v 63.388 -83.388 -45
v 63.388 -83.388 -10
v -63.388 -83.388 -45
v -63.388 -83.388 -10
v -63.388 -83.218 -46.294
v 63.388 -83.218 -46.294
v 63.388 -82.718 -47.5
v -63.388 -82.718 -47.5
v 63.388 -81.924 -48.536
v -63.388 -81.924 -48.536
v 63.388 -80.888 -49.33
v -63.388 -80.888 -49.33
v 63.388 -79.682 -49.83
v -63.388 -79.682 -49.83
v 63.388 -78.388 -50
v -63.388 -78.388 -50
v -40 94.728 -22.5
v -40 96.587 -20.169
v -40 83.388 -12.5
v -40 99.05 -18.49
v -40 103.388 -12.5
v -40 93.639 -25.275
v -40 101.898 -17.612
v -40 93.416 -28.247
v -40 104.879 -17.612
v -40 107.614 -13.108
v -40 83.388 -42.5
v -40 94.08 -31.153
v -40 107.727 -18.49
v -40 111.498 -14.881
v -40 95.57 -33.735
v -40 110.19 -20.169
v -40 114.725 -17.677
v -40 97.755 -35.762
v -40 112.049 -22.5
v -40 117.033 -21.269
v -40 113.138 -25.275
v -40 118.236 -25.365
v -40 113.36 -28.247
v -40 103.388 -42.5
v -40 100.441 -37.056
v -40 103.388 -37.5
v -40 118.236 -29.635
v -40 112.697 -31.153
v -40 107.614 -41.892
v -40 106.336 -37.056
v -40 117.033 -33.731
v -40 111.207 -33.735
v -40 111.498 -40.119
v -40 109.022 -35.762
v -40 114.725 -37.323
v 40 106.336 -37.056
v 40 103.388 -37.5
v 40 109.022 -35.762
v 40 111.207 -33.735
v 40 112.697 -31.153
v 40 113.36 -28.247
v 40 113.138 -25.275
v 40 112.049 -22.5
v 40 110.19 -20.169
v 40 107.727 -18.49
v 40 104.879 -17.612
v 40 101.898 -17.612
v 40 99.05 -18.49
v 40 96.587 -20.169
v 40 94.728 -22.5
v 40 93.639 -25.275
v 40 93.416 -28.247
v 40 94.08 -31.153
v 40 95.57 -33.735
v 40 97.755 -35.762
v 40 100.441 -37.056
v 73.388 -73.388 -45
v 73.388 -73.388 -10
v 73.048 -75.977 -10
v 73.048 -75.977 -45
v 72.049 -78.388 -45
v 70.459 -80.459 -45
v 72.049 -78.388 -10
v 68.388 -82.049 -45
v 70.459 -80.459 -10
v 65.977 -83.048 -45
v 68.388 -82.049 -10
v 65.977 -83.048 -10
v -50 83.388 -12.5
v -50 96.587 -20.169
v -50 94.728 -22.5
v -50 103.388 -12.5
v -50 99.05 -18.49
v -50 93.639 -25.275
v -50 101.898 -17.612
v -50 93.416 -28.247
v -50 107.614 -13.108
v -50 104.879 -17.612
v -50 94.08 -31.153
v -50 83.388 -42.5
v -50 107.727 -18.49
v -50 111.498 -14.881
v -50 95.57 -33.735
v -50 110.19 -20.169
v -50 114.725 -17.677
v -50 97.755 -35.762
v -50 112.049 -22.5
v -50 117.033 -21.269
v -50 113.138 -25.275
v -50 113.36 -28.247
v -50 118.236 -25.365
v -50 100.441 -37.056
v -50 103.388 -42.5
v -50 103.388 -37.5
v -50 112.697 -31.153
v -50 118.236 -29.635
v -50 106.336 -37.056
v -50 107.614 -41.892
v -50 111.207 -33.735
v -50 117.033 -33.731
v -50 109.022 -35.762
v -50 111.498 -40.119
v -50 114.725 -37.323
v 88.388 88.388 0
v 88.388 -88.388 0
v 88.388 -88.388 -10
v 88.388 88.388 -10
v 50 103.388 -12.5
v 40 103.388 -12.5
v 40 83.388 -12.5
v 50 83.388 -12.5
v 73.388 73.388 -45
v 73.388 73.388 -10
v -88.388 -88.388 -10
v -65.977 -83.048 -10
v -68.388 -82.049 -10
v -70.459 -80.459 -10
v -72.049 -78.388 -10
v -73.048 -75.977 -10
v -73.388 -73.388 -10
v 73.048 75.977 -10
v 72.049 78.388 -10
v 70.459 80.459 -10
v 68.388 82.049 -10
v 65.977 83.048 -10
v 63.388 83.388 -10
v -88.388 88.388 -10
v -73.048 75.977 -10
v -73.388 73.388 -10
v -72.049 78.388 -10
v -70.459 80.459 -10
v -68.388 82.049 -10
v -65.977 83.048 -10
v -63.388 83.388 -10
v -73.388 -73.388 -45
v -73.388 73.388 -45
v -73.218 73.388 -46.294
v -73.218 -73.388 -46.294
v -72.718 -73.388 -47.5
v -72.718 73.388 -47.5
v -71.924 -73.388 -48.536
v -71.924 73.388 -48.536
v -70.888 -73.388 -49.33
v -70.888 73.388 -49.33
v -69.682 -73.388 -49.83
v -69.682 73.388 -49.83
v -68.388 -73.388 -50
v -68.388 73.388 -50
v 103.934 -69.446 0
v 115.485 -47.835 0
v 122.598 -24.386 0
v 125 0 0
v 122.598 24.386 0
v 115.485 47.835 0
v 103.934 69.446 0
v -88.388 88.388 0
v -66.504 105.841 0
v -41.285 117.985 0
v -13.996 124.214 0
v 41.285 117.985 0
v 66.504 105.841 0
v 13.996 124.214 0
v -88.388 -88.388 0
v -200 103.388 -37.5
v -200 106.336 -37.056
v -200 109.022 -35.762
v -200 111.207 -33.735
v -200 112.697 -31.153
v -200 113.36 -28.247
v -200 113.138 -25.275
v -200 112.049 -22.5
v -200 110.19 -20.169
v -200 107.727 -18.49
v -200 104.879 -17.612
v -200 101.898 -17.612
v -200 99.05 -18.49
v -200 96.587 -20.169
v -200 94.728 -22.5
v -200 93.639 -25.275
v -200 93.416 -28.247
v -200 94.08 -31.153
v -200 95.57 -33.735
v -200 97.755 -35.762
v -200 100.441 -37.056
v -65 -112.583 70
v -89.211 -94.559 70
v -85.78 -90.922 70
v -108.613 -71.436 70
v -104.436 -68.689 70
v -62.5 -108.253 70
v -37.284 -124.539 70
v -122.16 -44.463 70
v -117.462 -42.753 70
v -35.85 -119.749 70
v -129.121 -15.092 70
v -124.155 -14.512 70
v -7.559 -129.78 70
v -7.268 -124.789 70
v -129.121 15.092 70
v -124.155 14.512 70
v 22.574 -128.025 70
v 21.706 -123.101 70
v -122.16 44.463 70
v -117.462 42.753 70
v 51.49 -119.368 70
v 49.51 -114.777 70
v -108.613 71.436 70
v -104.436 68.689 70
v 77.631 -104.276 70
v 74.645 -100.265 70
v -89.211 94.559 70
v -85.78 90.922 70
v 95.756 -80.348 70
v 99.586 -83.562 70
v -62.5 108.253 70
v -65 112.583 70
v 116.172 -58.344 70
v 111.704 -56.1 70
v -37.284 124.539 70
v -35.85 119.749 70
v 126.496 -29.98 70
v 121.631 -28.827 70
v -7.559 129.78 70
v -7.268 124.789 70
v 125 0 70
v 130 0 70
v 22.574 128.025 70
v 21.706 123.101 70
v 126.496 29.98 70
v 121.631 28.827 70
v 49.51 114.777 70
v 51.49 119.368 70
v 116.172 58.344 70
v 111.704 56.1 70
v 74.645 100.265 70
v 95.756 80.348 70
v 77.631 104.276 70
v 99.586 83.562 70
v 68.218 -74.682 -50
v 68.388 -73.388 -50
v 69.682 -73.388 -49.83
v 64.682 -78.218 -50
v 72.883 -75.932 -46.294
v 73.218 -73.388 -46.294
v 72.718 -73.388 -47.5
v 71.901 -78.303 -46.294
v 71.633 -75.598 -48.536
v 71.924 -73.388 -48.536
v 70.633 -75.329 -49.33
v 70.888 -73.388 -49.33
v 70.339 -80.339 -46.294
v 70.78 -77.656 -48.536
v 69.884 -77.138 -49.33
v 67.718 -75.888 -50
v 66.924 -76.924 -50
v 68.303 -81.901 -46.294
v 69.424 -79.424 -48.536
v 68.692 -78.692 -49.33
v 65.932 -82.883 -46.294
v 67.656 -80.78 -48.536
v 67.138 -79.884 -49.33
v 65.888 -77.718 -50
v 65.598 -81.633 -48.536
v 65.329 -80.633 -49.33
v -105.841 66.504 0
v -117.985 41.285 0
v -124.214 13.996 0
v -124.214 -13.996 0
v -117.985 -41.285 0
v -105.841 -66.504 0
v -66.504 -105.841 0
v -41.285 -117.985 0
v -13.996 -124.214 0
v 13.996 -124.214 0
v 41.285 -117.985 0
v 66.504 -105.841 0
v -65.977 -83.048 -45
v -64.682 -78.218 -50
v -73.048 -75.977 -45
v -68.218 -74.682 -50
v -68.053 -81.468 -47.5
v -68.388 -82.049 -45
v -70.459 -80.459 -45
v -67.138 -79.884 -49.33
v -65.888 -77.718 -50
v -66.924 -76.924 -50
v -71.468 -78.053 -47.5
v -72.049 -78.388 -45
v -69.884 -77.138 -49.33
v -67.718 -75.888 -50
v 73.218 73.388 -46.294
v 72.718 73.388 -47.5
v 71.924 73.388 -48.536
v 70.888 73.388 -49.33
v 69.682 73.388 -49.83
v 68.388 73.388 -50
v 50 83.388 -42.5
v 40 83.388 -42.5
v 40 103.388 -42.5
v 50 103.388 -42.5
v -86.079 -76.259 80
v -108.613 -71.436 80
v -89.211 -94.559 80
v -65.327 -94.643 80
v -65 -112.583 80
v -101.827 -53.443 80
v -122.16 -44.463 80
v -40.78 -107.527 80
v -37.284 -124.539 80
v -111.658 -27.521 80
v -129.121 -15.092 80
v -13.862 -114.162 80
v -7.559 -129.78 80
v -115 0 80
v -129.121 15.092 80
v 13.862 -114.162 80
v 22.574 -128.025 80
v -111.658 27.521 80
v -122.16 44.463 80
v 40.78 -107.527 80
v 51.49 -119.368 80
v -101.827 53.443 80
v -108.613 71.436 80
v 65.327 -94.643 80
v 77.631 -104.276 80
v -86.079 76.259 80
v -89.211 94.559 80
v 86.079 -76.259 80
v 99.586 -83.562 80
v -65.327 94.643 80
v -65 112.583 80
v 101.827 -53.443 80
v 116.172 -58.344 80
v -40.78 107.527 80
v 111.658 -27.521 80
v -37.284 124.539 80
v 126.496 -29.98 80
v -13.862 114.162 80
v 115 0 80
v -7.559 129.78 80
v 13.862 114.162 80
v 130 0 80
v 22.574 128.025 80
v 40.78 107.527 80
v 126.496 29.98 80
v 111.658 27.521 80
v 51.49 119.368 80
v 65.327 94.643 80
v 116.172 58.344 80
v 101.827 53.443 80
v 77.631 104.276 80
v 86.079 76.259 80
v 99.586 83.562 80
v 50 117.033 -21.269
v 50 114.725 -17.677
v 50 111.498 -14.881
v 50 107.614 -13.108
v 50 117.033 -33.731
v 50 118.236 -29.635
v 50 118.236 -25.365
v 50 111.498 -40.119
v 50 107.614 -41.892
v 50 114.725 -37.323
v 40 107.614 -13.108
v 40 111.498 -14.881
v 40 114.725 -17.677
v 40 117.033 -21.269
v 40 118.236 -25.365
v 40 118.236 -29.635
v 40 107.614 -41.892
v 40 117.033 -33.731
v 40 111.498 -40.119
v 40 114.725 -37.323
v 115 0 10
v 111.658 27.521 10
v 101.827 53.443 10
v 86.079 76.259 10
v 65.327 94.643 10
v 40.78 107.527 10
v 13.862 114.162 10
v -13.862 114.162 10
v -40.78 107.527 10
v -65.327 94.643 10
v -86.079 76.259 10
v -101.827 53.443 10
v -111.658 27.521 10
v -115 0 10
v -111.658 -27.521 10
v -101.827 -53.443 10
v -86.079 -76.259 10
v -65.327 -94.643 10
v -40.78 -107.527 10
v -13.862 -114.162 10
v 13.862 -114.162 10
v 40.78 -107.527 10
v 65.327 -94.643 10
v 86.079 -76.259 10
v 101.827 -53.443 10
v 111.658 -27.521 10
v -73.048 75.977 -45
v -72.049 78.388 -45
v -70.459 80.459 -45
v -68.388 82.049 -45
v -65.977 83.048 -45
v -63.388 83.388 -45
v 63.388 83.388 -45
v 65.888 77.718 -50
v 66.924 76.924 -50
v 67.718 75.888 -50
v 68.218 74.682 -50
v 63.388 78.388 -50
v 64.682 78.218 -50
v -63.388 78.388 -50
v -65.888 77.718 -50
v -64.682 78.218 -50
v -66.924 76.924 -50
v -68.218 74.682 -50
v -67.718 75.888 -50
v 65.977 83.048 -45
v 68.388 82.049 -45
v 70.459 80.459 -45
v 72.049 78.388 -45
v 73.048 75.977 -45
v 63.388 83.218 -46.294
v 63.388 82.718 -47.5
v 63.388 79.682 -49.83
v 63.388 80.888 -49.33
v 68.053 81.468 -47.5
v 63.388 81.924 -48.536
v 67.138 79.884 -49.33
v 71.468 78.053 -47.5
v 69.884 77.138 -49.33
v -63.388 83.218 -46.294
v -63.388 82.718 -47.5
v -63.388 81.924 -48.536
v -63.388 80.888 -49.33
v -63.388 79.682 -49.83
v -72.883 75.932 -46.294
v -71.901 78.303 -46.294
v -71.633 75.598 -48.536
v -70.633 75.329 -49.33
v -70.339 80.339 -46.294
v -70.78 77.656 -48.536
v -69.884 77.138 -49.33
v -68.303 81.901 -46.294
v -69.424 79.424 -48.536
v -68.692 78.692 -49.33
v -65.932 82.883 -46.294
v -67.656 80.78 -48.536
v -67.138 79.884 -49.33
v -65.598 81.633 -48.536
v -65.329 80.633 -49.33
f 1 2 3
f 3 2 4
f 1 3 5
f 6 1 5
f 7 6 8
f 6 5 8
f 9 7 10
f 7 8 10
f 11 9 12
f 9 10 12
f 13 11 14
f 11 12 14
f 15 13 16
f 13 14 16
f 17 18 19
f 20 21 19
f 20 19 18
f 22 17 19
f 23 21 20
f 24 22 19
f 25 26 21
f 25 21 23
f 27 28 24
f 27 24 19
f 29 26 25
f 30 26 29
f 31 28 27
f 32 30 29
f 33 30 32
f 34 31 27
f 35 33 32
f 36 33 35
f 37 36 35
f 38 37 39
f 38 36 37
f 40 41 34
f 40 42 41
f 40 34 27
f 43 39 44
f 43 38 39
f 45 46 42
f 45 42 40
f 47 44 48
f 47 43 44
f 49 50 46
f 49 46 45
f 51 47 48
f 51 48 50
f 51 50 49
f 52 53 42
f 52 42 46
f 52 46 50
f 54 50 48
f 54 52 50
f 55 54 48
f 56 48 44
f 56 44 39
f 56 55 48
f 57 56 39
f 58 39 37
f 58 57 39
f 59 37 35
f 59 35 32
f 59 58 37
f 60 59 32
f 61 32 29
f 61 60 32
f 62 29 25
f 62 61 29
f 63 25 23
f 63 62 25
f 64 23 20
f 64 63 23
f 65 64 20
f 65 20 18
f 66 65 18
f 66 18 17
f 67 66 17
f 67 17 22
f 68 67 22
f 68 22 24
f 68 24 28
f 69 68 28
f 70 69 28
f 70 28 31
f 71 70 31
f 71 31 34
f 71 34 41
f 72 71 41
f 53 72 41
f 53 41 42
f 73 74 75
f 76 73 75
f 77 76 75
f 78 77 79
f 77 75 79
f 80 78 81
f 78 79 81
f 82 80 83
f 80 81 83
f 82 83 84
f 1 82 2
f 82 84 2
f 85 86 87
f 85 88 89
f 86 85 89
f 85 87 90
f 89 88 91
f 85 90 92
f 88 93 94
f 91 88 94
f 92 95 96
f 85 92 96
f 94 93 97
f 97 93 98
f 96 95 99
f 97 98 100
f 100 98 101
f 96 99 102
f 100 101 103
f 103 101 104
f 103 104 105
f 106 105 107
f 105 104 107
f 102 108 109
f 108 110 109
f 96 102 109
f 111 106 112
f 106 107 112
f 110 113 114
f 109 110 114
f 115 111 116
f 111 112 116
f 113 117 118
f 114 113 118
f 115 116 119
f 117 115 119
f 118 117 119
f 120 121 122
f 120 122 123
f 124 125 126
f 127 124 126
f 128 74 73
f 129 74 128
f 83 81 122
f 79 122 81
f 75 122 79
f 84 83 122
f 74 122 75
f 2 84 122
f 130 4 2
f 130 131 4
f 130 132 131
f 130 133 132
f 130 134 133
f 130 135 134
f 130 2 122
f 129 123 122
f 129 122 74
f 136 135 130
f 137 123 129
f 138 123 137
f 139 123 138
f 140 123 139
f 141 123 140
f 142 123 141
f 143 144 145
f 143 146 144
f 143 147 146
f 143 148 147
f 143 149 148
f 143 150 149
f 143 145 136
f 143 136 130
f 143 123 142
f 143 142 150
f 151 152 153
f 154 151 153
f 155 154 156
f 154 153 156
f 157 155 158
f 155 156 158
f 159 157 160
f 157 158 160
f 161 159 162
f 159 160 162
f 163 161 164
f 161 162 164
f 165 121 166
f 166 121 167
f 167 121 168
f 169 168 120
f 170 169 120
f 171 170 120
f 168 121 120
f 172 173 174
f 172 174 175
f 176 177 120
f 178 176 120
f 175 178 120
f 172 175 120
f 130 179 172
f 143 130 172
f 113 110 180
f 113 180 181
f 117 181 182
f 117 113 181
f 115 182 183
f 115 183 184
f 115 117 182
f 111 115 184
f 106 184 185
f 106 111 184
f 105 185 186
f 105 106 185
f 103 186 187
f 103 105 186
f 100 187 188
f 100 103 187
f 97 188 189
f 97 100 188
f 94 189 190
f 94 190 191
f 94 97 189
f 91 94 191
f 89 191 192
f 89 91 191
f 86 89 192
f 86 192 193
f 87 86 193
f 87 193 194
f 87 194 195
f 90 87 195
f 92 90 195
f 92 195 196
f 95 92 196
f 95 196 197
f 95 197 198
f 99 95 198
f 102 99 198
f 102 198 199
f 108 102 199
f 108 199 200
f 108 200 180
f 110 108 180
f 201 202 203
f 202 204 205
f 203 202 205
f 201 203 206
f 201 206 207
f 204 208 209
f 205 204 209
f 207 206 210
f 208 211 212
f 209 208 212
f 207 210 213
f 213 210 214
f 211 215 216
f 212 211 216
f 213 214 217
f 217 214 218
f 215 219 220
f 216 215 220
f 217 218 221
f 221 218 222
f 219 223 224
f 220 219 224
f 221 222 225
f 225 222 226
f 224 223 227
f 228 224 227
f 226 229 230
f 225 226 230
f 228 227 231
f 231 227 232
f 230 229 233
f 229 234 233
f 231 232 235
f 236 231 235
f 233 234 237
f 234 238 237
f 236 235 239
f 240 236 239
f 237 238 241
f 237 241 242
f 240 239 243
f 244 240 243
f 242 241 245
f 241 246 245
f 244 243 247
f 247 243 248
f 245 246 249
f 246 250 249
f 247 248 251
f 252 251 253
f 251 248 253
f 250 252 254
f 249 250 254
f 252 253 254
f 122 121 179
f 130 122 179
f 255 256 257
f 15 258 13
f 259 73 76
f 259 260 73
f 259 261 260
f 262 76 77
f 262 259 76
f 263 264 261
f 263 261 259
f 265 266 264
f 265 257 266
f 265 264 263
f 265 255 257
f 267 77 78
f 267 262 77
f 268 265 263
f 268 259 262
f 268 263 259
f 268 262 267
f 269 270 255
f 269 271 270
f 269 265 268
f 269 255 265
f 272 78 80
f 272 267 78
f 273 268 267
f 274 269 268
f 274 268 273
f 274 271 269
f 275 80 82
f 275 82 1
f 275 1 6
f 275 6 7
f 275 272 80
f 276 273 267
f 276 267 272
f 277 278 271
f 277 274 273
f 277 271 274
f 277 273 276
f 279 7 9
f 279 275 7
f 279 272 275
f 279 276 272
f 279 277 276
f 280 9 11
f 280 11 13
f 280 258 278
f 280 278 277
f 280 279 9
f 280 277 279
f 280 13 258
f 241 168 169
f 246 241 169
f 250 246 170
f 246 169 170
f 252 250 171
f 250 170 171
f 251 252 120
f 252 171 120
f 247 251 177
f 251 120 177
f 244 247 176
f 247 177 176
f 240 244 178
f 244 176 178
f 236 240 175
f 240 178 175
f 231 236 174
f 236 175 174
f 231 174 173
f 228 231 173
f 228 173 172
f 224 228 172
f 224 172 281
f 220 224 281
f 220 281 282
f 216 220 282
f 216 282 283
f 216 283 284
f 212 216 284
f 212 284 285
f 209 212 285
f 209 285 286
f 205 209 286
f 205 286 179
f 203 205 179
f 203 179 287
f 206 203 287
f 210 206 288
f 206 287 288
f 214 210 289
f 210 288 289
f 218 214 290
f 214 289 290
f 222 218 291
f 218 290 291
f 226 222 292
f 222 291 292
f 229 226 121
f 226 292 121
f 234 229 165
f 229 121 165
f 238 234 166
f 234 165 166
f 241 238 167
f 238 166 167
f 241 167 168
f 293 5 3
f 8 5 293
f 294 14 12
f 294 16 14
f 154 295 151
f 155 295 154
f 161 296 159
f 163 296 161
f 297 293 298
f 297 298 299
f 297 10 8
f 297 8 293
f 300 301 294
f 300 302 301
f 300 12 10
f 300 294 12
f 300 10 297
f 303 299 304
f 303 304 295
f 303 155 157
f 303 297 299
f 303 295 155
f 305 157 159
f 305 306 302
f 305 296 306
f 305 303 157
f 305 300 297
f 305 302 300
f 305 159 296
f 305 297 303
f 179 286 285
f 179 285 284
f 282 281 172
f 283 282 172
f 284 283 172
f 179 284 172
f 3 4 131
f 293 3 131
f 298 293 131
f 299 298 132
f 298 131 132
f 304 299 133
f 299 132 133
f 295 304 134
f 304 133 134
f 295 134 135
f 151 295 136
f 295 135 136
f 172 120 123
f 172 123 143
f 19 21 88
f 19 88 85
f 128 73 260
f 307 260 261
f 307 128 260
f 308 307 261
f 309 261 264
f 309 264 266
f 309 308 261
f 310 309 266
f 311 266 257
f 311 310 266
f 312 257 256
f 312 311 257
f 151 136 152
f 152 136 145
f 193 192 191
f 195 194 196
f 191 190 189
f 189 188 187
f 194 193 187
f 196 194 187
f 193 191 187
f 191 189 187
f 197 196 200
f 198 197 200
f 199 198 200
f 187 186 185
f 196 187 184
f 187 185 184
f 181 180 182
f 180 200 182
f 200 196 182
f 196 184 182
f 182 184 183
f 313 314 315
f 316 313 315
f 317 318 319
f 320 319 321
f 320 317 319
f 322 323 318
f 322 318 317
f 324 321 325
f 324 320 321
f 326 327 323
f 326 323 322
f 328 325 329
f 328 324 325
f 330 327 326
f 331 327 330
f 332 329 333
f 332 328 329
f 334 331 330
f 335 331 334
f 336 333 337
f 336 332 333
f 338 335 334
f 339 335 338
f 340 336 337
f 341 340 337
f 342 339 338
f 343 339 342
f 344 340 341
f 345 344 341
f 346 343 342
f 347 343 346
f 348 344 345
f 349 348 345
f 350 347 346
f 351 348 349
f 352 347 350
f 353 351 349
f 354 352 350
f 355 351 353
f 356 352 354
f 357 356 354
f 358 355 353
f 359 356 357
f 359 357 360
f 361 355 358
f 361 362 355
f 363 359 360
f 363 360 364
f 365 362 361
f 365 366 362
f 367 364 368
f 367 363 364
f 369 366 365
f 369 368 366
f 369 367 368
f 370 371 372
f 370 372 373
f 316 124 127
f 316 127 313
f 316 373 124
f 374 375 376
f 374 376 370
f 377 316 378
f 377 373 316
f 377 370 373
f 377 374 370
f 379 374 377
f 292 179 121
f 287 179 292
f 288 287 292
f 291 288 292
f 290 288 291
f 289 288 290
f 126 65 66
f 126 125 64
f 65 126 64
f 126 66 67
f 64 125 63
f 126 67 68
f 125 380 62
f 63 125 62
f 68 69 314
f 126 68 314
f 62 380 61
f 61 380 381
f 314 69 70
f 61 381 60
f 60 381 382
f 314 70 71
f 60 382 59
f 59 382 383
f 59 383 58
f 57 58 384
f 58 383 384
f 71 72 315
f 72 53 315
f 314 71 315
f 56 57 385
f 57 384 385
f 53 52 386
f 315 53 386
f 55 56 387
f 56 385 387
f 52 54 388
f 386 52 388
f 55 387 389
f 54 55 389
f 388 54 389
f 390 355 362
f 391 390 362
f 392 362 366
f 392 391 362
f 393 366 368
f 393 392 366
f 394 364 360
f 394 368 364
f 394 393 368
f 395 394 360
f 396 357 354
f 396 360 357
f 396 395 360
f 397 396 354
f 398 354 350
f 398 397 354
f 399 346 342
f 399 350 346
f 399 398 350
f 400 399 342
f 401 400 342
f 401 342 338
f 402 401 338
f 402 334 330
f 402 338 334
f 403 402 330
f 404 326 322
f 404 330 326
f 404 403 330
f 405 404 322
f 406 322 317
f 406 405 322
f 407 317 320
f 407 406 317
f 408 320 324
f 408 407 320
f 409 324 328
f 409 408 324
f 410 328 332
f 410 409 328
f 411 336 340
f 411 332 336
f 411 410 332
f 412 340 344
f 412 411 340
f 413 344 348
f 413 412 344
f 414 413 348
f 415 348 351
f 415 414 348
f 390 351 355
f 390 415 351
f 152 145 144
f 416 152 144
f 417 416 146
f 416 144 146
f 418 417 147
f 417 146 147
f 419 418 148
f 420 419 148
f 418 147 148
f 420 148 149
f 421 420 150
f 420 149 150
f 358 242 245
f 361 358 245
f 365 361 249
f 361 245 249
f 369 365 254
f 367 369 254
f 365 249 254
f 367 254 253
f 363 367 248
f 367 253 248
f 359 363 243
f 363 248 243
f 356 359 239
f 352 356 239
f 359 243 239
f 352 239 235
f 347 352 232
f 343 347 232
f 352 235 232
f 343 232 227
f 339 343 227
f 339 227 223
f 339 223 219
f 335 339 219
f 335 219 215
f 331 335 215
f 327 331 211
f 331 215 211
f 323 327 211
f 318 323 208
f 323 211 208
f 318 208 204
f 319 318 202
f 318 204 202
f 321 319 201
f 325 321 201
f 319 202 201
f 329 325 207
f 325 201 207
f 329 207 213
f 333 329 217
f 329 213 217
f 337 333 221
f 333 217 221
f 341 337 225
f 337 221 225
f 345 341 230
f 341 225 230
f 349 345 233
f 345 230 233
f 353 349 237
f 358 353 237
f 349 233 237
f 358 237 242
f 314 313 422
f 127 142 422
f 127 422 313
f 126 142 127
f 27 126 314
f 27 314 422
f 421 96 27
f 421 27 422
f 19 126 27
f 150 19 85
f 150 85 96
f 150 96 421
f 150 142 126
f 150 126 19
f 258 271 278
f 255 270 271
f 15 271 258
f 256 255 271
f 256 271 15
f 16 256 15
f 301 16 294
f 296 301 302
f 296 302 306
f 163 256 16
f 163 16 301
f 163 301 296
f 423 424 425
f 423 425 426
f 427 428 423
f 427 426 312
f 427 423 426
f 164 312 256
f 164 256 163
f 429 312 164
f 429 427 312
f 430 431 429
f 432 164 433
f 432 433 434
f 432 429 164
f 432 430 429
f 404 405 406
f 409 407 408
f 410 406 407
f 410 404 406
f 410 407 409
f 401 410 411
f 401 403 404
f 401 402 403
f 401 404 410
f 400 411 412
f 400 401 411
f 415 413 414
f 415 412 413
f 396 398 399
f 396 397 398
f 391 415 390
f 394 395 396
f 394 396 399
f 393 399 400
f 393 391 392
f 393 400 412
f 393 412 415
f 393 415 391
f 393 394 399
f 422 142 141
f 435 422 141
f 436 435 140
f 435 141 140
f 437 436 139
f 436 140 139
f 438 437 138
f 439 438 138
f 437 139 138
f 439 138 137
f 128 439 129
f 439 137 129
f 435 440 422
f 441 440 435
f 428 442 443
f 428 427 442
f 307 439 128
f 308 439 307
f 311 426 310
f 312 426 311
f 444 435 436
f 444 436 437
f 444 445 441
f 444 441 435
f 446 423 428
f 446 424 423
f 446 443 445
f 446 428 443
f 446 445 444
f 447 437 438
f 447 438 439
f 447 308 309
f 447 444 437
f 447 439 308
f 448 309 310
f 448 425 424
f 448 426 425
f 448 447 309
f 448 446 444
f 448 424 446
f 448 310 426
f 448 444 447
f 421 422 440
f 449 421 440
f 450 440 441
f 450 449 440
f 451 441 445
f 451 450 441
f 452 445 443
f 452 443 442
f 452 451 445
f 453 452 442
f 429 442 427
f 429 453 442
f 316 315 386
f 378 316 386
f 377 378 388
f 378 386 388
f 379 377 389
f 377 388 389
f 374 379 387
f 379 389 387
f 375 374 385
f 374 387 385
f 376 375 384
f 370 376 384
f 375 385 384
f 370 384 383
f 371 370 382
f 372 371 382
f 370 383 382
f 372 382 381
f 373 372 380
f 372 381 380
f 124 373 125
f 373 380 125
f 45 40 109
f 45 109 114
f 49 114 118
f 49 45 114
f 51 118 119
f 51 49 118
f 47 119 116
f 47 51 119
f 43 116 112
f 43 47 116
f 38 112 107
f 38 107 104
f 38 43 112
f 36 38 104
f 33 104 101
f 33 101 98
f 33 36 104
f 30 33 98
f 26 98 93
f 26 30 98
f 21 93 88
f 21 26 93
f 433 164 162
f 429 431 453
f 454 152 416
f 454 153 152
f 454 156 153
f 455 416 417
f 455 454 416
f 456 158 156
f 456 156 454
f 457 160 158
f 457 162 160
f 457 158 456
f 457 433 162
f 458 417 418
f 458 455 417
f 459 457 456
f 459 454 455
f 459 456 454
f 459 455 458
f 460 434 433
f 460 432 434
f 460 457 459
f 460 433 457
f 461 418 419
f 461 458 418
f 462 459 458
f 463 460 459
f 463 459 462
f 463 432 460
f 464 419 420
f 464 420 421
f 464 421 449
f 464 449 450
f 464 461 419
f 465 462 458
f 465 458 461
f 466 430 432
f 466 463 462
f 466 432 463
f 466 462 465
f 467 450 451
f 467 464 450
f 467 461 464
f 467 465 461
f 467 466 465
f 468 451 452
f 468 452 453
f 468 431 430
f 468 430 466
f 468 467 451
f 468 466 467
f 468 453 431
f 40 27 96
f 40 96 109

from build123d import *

# Parameters (mm, degrees)
LIGHT_SKETCH_R              = 125
LIGHT_EXTRUDE_DEPTH         = 80
LIGHT_SHELL_T               = -10
APERTURE_START              = -10
APERTURE_LIP_SKETCH_R       = 130
APERTURE_LIP_SKETCH_R_2     = 115
APERTURE_LIP_EXTRUDE_DEPTH  = 10
PLATE_SKETCH_W              = 176.776695296
PLATE_SKETCH_H              = 176.776695296
PLATE_EXTRUDE_DEPTH         = 10
ELECTRONICS_SKETCH_W        = 146.776695296
ELECTRONICS_SKETCH_H        = 166.776695296
ELECTRONICS_EXTRUDE_DEPTH   = 40
ELECTRONICS_BACK_FILLET_R   = 5
ELECTRONICS_SIDE_FILLET_R   = 10
HINGE_SUPPORT_EXTRUDE_DEPTH = 10
HINGE_POLE_SKETCH_R         = 10
HINGE_POLE_EXTRUDE_DEPTH    = 250


with BuildPart() as part:
    # Light Sketch → Light Extrude (new body)
    with BuildSketch(Plane.XY):
        Circle(LIGHT_SKETCH_R)
    extrude(amount=LIGHT_EXTRUDE_DEPTH)

    # Light Shell
    light_shell_openings = [part.faces().sort_by_distance(p)[0] for p in [
        (0, 0, 80),
    ]]
    offset(amount=LIGHT_SHELL_T, openings=light_shell_openings, kind=Kind.INTERSECTION)

    # Aperture Lip Sketch → Aperture Lip Extrude (add)
    with BuildSketch(Plane.XY.offset(80).offset(APERTURE_START)):
        Circle(APERTURE_LIP_SKETCH_R)
        Circle(APERTURE_LIP_SKETCH_R_2, mode=Mode.SUBTRACT)
    extrude(amount=APERTURE_LIP_EXTRUDE_DEPTH)

    # Plate Sketch → Plate Extrude (add)
    with BuildSketch(Plane(origin=(0, 0, 0), x_dir=(-1, 0, 0), z_dir=(0, 0, -1))):
        Rectangle(PLATE_SKETCH_W, PLATE_SKETCH_H)
    extrude(amount=PLATE_EXTRUDE_DEPTH)

    # Electronics Sketch → Electronics Extrude (add)
    with BuildSketch(Plane(origin=(0, 0, -10), x_dir=(-1, 0, 0), z_dir=(0, 0, -1))):
        Rectangle(ELECTRONICS_SKETCH_W, ELECTRONICS_SKETCH_H)
    extrude(amount=ELECTRONICS_EXTRUDE_DEPTH)

    # Electronics Back Fillet
    electronics_back_fillet_edges = [part.edges().sort_by_distance(p)[0] for p in [
        (73.388347648, 0, -50),
        (0, -83.388347648, -50),
        (-73.388347648, 0, -50),
        (0, 83.388347648, -50),
    ]]
    fillet(electronics_back_fillet_edges, radius=ELECTRONICS_BACK_FILLET_R)

    # Electronics Side Fillet
    # the kernel refuses this fillet: 10 mm, written as the material it takes off along each edge
    with BuildSketch(Plane(origin=(-63.388347648, -73.388347648, -50), x_dir=(0, -1, 0), z_dir=(1, 0, 0))) as electronics_side_fillet_piece_1:
        with BuildLine():
            CenterArc((5, -5), 5, 0, 90)
            Line((10, -5), (10, 0))
            Line((10, 0), (5, 0))
        make_face()
    revolve(axis=Axis((-63.388347648, -73.388347648, -50), (0, 0, -1)), revolution_arc=90, mode=Mode.SUBTRACT)
    with BuildSketch(Plane(origin=(63.388347648, -73.388347648, -50), x_dir=(1, 0, 0), z_dir=(0, 1, 0))) as electronics_side_fillet_piece_2:
        with BuildLine():
            CenterArc((5, -5), 5, 0, 90)
            Line((10, -5), (10, 0))
            Line((10, 0), (5, 0))
        make_face()
    revolve(axis=Axis((63.388347648, -73.388347648, -50), (0, 0, -1)), revolution_arc=90, mode=Mode.SUBTRACT)
    with BuildSketch(Plane(origin=(-63.388347648, 73.388347648, -50), x_dir=(-1, 0, 0), z_dir=(0, -1, 0))) as electronics_side_fillet_piece_3:
        with BuildLine():
            CenterArc((5, -5), 5, 0, 90)
            Line((10, -5), (10, 0))
            Line((10, 0), (5, 0))
        make_face()
    revolve(axis=Axis((-63.388347648, 73.388347648, -50), (0, 0, -1)), revolution_arc=90, mode=Mode.SUBTRACT)
    with BuildSketch(Plane(origin=(63.388347648, 73.388347648, -50), x_dir=(0, 1, 0), z_dir=(-1, 0, 0))) as electronics_side_fillet_piece_4:
        with BuildLine():
            CenterArc((5, -5), 5, 0, 90)
            Line((10, -5), (10, 0))
            Line((10, 0), (5, 0))
        make_face()
    revolve(axis=Axis((63.388347648, 73.388347648, -50), (0, 0, -1)), revolution_arc=90, mode=Mode.SUBTRACT)
    with BuildSketch(Plane(origin=(73.388347648, 83.388347648, -10), x_dir=(-1, 0, 0), z_dir=(0, 0, -1)), Plane(origin=(-73.388347648, 83.388347648, -10), x_dir=(0, -1, 0), z_dir=(0, 0, -1))) as electronics_side_fillet_piece_5:
        with BuildLine():
            CenterArc((ELECTRONICS_SIDE_FILLET_R, -ELECTRONICS_SIDE_FILLET_R), ELECTRONICS_SIDE_FILLET_R, 90, 90)
            Line((0, -ELECTRONICS_SIDE_FILLET_R), (0, 0))
            Line((0, 0), (ELECTRONICS_SIDE_FILLET_R, 0))
        make_face()
    extrude(amount=40, mode=Mode.SUBTRACT)
    with BuildSketch(Plane(origin=(-73.388347648, -83.388347648, -10), x_dir=(0, 1, 0), z_dir=(0, 0, -1)), Plane(origin=(73.388347648, -83.388347648, -10), x_dir=(-1, 0, 0), z_dir=(0, 0, -1))) as electronics_side_fillet_piece_6:
        with BuildLine():
            CenterArc((ELECTRONICS_SIDE_FILLET_R, ELECTRONICS_SIDE_FILLET_R), ELECTRONICS_SIDE_FILLET_R, 180, 90)
            Line((0, ELECTRONICS_SIDE_FILLET_R), (0, 0))
            Line((0, 0), (ELECTRONICS_SIDE_FILLET_R, 0))
        make_face()
    extrude(amount=40, mode=Mode.SUBTRACT)

    # Hinge Support Sketch → Hinge Support Extrude (add)
    with BuildSketch(Plane(origin=(40, 0, 0), x_dir=(0, 0, -1), z_dir=(1, 0, 0))):
        with BuildLine():
            Line((12.5, 103.388347648), (12.5, 83.388347648))
            Line((12.5, 83.388347648), (42.5, 83.388347648))
            Line((42.5, 83.388347648), (42.5, 103.388347648))
            ThreePointArc((42.5, 103.388347648), (27.5, 118.388347648), (12.5, 103.388347648))
        make_face()
    hinge_support_extrude = extrude(amount=HINGE_SUPPORT_EXTRUDE_DEPTH)

    # Hinge Support Mirror: Hinge Support Extrude across plane
    add(hinge_support_extrude.mirror(Plane(origin=(0, 0, 0), x_dir=(0, 0, 1), z_dir=(1, 0, 0))))

    # Hinge Pole Sketch → Hinge Pole Extrude (add)
    with BuildSketch(Plane(origin=(50, 0, 0), x_dir=(0, 0, -1), z_dir=(1, 0, 0))):
        with Locations((27.5, 103.388347648)):
            Circle(HINGE_POLE_SKETCH_R)
    extrude(amount=-HINGE_POLE_EXTRUDE_DEPTH)


solid = part.part
